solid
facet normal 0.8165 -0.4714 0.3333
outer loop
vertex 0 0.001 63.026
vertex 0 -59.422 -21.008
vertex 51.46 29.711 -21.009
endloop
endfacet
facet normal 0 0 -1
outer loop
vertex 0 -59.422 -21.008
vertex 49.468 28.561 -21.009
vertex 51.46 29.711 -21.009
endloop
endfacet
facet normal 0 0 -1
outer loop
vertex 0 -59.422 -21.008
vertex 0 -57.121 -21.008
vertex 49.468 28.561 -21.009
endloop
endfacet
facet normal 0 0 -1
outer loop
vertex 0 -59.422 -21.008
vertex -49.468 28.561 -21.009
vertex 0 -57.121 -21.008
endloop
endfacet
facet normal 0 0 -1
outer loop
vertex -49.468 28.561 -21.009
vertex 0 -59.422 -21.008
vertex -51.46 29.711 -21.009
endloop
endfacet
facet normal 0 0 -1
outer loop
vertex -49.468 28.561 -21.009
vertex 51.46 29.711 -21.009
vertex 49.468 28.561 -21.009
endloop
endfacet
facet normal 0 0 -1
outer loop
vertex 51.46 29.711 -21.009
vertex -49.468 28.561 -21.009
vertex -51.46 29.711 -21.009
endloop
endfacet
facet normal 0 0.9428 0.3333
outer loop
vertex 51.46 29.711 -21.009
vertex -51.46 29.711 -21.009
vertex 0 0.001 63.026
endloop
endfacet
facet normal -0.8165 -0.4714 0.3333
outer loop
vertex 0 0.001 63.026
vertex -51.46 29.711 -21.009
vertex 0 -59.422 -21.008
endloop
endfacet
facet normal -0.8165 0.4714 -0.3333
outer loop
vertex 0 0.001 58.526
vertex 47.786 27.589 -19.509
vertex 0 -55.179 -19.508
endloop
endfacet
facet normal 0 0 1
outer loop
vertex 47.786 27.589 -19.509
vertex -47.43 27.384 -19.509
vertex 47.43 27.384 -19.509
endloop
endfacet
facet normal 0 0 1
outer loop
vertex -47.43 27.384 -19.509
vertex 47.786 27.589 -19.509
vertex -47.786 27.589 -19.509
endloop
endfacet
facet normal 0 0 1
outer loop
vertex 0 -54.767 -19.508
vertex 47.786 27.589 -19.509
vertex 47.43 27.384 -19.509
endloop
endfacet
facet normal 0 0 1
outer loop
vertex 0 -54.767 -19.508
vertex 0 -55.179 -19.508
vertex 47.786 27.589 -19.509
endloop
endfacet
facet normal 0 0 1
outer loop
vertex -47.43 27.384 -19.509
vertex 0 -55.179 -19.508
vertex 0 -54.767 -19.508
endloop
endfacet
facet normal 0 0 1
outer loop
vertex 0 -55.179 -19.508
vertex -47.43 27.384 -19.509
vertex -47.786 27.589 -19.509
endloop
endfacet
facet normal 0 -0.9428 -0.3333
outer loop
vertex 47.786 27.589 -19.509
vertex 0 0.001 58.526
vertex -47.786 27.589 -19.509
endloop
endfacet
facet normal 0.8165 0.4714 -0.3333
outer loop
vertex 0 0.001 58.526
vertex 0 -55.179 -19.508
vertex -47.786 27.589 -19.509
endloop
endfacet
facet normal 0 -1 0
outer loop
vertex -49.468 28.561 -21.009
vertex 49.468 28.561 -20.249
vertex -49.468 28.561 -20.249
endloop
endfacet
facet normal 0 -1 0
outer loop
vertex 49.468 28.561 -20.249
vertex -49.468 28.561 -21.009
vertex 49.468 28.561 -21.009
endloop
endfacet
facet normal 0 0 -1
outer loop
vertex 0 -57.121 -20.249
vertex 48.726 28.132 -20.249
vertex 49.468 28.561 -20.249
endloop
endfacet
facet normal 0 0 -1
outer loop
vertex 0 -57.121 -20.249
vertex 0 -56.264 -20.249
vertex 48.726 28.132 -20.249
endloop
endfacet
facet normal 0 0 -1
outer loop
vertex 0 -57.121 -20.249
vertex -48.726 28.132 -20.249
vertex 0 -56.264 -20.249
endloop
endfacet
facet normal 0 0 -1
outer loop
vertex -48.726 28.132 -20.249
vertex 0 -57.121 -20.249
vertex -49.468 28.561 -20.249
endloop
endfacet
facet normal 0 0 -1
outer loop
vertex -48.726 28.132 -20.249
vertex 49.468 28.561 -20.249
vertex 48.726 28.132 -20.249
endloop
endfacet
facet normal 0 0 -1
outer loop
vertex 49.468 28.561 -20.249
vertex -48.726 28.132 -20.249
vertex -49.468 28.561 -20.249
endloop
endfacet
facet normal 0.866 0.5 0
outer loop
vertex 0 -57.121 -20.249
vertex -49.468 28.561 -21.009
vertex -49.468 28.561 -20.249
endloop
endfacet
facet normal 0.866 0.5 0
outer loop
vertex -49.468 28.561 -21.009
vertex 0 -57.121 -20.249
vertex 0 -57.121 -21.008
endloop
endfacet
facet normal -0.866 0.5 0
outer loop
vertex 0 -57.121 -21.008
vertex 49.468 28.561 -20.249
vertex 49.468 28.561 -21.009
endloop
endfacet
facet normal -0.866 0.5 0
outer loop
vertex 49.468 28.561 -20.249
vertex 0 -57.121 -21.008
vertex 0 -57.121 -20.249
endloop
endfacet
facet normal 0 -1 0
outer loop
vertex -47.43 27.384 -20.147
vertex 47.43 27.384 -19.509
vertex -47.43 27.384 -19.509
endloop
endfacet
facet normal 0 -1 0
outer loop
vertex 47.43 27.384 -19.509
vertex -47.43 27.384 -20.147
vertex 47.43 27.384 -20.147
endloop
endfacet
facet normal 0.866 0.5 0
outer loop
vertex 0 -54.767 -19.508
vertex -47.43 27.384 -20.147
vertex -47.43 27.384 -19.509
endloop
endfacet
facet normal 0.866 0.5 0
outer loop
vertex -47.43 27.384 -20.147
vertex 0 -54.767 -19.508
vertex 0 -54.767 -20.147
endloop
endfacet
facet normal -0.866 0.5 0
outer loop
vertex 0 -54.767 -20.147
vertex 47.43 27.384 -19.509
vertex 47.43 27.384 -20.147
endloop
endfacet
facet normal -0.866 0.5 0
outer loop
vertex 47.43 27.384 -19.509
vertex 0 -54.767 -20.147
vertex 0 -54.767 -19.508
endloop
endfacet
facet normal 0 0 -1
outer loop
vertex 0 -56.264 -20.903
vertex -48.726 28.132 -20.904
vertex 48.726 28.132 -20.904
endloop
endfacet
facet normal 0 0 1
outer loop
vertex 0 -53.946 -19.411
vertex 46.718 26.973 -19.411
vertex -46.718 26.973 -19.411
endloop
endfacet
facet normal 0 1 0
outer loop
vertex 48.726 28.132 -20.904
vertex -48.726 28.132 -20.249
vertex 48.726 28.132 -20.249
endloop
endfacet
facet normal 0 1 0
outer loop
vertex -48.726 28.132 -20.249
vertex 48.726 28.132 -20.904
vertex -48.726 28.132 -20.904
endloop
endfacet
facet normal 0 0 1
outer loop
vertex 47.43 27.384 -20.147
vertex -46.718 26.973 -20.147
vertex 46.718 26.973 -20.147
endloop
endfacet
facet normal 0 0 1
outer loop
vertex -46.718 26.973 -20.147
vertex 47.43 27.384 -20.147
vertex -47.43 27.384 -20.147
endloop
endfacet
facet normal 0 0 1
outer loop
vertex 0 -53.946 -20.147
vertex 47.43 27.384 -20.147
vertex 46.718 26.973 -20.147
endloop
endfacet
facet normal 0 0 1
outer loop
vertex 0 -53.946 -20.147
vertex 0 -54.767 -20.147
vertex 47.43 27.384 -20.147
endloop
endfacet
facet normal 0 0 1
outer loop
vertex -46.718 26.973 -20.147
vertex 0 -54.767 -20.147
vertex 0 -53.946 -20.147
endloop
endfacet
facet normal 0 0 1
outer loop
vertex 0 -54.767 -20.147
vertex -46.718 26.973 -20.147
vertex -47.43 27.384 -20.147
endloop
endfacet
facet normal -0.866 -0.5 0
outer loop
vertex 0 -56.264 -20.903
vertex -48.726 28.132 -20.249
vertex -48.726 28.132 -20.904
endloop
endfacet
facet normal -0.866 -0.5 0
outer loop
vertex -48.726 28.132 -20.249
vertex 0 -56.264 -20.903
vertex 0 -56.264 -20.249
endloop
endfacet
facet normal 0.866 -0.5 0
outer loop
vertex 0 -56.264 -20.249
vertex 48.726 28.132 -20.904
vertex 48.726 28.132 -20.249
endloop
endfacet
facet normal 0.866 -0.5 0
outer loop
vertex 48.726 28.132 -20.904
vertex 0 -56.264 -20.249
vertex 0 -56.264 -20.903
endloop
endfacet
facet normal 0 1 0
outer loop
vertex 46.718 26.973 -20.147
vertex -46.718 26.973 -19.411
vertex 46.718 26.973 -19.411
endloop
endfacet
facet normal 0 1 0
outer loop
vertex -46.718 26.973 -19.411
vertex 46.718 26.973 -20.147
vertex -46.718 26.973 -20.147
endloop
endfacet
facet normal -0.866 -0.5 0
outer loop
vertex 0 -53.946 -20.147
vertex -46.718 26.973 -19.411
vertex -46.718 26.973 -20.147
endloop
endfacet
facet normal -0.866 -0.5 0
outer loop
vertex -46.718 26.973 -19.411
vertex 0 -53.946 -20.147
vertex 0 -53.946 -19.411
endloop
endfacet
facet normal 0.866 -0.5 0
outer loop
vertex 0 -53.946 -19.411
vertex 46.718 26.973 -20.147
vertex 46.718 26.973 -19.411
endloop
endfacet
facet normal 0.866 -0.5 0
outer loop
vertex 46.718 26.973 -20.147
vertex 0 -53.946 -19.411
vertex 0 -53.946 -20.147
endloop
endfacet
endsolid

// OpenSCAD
arete = 102.921;
paroi = 1.5;
echelleReductionAjustementBouchon = 0.985;
r = 0.19; // résolution d'impression sur l'axe Z
tetra_sch = [3,3];
Cpi = 3.14159;
Cphi = (1+sqrt(5))/2;
Cepsilon = 0.00000001;

function tetra_ext_radius(a) = 
    a/4*sqrt(6);
    
function tetra_int_radius(a) = 
    a/12*sqrt(6);
    
function tetra_arete_from(radius) = 
    radius*12/sqrt(6);
    
externalRadius = tetra_ext_radius(arete);
internalRadius = tetra_ext_radius( 
                    tetra_arete_from(
                        tetra_int_radius(arete)-paroi));
                        
echo(externalRadius); 
echo(internalRadius);

//tetrahedron(arete);
//tetra_creux();
//decoupe_bouchon();
corps_ouvert();
bouchon();
//trou();

module corps_ouvert() {
	difference() {
		tetra_creux();
		decoupe_bouchon();
	}
}

module bouchon() {
//    rotate([180, 0, 0])
	scale([echelleReductionAjustementBouchon, echelleReductionAjustementBouchon, 0.995])
	difference () {
        intersection() {
            tetra_creux();
            decoupe_bouchon(echelleReductionAjustementBouchon);
        }
	}
}

module tetra_creux() {
	difference() {
        tetrahedron(externalRadius);
        tetrahedron(internalRadius);
	}
}

module decoupe_bouchon(scale=1) {
    distance = tetra_int_radius(arete);
	rotate([0,0,30]) translate([0,0,-distance-2*r])
		cylinder(6*r, r=arete*0.555, $fn=3);
	rotate([0,0,30]) translate([0,0,-distance])
		cylinder(8*r, r=(arete-paroi)*0.54, $fn=3);
}


module tetrahedron(rad) {
    // create an instance of a spherical coordinate
    // long - rotation around z -axis
    // lat - latitude, starting at 0 == 'north pole'
    // rad - distance from center
    function sph(long, lat, rad=1) = [long, lat, rad];
    
    // Convert spherical to cartesian
    function sph_to_cart(s) = [
	clean(s[2]*sin(s[1])*cos(s[0])),  

	clean(s[2]*sin(s[1])*sin(s[0])),

	clean(s[2]*cos(s[1]))
	];

    function sphu_from_cart(c, rad=1) = sph(
        atan2(c[1],c[0]), 
        atan2(sqrt(c[0]*c[0]+c[1]*c[1]), c[2]), 
        rad
        );

    tetra_cart = [
        [+1, +1, +1],
        [-1, -1, +1],
        [-1, +1, -1],
        [+1, -1, -1]
    ];

    function tetra_unit(rad=1) = [
        sph_to_cart(sphu_from_cart(tetra_cart[0], rad)), 
        sph_to_cart(sphu_from_cart(tetra_cart[1], rad)),
        sph_to_cart(sphu_from_cart(tetra_cart[2], rad)),
        sph_to_cart(sphu_from_cart(tetra_cart[3], rad)),
        ];


    tetrafaces = [
        [0, 3, 1],
        [0,1,2],
        [2,1,3],
        [0,2,3]
    ];

    tetra_edges = [
        [0,1],
        [0,2],
        [0,3], 
        [1,2], 
        [1,3], 
        [2,3],	
        ];

    rotate([54.735, 0, 0])
    rotate([0, 0, 45])
    polyhedron(tetra_unit(rad), faces=tetrafaces);
}
//translate([0, 0, -17.7])
//cylinder(5,40,40);

function clean(n) = (n < 0) ? ((n < -Cepsilon) ? n : 0) : 
	(n < Cepsilon) ? 0 : n; 

function plat_dihedral(pq) = 2 * asin( cos(180/pq[1])/sin(180/pq[0]));

function plat_circumradius(pq, a) = 
	(a/2)*
	tan(Cpi/pq[1])*
	tan(plat_dihedral(pq)/2);

function plat_midradius(pq, a) = 
	(a/2)*
	cos(Cpi/pq[0])*
	tan(plat_dihedral(pq)/2);

function plat_inradius(pq,a) = 
	a/(2*tan(Cpi/pq[0]))*
	sqrt((1-cos(plat_dihedral(pq)))/(1+cos(plat_dihedral(pq))));

function plat_a_from_inradius(pq, inradius) =
    inradius*(2*tan(Cpi/pq[0]))/
	sqrt((1-cos(plat_dihedral(pq)))/(1+cos(plat_dihedral(pq))));
